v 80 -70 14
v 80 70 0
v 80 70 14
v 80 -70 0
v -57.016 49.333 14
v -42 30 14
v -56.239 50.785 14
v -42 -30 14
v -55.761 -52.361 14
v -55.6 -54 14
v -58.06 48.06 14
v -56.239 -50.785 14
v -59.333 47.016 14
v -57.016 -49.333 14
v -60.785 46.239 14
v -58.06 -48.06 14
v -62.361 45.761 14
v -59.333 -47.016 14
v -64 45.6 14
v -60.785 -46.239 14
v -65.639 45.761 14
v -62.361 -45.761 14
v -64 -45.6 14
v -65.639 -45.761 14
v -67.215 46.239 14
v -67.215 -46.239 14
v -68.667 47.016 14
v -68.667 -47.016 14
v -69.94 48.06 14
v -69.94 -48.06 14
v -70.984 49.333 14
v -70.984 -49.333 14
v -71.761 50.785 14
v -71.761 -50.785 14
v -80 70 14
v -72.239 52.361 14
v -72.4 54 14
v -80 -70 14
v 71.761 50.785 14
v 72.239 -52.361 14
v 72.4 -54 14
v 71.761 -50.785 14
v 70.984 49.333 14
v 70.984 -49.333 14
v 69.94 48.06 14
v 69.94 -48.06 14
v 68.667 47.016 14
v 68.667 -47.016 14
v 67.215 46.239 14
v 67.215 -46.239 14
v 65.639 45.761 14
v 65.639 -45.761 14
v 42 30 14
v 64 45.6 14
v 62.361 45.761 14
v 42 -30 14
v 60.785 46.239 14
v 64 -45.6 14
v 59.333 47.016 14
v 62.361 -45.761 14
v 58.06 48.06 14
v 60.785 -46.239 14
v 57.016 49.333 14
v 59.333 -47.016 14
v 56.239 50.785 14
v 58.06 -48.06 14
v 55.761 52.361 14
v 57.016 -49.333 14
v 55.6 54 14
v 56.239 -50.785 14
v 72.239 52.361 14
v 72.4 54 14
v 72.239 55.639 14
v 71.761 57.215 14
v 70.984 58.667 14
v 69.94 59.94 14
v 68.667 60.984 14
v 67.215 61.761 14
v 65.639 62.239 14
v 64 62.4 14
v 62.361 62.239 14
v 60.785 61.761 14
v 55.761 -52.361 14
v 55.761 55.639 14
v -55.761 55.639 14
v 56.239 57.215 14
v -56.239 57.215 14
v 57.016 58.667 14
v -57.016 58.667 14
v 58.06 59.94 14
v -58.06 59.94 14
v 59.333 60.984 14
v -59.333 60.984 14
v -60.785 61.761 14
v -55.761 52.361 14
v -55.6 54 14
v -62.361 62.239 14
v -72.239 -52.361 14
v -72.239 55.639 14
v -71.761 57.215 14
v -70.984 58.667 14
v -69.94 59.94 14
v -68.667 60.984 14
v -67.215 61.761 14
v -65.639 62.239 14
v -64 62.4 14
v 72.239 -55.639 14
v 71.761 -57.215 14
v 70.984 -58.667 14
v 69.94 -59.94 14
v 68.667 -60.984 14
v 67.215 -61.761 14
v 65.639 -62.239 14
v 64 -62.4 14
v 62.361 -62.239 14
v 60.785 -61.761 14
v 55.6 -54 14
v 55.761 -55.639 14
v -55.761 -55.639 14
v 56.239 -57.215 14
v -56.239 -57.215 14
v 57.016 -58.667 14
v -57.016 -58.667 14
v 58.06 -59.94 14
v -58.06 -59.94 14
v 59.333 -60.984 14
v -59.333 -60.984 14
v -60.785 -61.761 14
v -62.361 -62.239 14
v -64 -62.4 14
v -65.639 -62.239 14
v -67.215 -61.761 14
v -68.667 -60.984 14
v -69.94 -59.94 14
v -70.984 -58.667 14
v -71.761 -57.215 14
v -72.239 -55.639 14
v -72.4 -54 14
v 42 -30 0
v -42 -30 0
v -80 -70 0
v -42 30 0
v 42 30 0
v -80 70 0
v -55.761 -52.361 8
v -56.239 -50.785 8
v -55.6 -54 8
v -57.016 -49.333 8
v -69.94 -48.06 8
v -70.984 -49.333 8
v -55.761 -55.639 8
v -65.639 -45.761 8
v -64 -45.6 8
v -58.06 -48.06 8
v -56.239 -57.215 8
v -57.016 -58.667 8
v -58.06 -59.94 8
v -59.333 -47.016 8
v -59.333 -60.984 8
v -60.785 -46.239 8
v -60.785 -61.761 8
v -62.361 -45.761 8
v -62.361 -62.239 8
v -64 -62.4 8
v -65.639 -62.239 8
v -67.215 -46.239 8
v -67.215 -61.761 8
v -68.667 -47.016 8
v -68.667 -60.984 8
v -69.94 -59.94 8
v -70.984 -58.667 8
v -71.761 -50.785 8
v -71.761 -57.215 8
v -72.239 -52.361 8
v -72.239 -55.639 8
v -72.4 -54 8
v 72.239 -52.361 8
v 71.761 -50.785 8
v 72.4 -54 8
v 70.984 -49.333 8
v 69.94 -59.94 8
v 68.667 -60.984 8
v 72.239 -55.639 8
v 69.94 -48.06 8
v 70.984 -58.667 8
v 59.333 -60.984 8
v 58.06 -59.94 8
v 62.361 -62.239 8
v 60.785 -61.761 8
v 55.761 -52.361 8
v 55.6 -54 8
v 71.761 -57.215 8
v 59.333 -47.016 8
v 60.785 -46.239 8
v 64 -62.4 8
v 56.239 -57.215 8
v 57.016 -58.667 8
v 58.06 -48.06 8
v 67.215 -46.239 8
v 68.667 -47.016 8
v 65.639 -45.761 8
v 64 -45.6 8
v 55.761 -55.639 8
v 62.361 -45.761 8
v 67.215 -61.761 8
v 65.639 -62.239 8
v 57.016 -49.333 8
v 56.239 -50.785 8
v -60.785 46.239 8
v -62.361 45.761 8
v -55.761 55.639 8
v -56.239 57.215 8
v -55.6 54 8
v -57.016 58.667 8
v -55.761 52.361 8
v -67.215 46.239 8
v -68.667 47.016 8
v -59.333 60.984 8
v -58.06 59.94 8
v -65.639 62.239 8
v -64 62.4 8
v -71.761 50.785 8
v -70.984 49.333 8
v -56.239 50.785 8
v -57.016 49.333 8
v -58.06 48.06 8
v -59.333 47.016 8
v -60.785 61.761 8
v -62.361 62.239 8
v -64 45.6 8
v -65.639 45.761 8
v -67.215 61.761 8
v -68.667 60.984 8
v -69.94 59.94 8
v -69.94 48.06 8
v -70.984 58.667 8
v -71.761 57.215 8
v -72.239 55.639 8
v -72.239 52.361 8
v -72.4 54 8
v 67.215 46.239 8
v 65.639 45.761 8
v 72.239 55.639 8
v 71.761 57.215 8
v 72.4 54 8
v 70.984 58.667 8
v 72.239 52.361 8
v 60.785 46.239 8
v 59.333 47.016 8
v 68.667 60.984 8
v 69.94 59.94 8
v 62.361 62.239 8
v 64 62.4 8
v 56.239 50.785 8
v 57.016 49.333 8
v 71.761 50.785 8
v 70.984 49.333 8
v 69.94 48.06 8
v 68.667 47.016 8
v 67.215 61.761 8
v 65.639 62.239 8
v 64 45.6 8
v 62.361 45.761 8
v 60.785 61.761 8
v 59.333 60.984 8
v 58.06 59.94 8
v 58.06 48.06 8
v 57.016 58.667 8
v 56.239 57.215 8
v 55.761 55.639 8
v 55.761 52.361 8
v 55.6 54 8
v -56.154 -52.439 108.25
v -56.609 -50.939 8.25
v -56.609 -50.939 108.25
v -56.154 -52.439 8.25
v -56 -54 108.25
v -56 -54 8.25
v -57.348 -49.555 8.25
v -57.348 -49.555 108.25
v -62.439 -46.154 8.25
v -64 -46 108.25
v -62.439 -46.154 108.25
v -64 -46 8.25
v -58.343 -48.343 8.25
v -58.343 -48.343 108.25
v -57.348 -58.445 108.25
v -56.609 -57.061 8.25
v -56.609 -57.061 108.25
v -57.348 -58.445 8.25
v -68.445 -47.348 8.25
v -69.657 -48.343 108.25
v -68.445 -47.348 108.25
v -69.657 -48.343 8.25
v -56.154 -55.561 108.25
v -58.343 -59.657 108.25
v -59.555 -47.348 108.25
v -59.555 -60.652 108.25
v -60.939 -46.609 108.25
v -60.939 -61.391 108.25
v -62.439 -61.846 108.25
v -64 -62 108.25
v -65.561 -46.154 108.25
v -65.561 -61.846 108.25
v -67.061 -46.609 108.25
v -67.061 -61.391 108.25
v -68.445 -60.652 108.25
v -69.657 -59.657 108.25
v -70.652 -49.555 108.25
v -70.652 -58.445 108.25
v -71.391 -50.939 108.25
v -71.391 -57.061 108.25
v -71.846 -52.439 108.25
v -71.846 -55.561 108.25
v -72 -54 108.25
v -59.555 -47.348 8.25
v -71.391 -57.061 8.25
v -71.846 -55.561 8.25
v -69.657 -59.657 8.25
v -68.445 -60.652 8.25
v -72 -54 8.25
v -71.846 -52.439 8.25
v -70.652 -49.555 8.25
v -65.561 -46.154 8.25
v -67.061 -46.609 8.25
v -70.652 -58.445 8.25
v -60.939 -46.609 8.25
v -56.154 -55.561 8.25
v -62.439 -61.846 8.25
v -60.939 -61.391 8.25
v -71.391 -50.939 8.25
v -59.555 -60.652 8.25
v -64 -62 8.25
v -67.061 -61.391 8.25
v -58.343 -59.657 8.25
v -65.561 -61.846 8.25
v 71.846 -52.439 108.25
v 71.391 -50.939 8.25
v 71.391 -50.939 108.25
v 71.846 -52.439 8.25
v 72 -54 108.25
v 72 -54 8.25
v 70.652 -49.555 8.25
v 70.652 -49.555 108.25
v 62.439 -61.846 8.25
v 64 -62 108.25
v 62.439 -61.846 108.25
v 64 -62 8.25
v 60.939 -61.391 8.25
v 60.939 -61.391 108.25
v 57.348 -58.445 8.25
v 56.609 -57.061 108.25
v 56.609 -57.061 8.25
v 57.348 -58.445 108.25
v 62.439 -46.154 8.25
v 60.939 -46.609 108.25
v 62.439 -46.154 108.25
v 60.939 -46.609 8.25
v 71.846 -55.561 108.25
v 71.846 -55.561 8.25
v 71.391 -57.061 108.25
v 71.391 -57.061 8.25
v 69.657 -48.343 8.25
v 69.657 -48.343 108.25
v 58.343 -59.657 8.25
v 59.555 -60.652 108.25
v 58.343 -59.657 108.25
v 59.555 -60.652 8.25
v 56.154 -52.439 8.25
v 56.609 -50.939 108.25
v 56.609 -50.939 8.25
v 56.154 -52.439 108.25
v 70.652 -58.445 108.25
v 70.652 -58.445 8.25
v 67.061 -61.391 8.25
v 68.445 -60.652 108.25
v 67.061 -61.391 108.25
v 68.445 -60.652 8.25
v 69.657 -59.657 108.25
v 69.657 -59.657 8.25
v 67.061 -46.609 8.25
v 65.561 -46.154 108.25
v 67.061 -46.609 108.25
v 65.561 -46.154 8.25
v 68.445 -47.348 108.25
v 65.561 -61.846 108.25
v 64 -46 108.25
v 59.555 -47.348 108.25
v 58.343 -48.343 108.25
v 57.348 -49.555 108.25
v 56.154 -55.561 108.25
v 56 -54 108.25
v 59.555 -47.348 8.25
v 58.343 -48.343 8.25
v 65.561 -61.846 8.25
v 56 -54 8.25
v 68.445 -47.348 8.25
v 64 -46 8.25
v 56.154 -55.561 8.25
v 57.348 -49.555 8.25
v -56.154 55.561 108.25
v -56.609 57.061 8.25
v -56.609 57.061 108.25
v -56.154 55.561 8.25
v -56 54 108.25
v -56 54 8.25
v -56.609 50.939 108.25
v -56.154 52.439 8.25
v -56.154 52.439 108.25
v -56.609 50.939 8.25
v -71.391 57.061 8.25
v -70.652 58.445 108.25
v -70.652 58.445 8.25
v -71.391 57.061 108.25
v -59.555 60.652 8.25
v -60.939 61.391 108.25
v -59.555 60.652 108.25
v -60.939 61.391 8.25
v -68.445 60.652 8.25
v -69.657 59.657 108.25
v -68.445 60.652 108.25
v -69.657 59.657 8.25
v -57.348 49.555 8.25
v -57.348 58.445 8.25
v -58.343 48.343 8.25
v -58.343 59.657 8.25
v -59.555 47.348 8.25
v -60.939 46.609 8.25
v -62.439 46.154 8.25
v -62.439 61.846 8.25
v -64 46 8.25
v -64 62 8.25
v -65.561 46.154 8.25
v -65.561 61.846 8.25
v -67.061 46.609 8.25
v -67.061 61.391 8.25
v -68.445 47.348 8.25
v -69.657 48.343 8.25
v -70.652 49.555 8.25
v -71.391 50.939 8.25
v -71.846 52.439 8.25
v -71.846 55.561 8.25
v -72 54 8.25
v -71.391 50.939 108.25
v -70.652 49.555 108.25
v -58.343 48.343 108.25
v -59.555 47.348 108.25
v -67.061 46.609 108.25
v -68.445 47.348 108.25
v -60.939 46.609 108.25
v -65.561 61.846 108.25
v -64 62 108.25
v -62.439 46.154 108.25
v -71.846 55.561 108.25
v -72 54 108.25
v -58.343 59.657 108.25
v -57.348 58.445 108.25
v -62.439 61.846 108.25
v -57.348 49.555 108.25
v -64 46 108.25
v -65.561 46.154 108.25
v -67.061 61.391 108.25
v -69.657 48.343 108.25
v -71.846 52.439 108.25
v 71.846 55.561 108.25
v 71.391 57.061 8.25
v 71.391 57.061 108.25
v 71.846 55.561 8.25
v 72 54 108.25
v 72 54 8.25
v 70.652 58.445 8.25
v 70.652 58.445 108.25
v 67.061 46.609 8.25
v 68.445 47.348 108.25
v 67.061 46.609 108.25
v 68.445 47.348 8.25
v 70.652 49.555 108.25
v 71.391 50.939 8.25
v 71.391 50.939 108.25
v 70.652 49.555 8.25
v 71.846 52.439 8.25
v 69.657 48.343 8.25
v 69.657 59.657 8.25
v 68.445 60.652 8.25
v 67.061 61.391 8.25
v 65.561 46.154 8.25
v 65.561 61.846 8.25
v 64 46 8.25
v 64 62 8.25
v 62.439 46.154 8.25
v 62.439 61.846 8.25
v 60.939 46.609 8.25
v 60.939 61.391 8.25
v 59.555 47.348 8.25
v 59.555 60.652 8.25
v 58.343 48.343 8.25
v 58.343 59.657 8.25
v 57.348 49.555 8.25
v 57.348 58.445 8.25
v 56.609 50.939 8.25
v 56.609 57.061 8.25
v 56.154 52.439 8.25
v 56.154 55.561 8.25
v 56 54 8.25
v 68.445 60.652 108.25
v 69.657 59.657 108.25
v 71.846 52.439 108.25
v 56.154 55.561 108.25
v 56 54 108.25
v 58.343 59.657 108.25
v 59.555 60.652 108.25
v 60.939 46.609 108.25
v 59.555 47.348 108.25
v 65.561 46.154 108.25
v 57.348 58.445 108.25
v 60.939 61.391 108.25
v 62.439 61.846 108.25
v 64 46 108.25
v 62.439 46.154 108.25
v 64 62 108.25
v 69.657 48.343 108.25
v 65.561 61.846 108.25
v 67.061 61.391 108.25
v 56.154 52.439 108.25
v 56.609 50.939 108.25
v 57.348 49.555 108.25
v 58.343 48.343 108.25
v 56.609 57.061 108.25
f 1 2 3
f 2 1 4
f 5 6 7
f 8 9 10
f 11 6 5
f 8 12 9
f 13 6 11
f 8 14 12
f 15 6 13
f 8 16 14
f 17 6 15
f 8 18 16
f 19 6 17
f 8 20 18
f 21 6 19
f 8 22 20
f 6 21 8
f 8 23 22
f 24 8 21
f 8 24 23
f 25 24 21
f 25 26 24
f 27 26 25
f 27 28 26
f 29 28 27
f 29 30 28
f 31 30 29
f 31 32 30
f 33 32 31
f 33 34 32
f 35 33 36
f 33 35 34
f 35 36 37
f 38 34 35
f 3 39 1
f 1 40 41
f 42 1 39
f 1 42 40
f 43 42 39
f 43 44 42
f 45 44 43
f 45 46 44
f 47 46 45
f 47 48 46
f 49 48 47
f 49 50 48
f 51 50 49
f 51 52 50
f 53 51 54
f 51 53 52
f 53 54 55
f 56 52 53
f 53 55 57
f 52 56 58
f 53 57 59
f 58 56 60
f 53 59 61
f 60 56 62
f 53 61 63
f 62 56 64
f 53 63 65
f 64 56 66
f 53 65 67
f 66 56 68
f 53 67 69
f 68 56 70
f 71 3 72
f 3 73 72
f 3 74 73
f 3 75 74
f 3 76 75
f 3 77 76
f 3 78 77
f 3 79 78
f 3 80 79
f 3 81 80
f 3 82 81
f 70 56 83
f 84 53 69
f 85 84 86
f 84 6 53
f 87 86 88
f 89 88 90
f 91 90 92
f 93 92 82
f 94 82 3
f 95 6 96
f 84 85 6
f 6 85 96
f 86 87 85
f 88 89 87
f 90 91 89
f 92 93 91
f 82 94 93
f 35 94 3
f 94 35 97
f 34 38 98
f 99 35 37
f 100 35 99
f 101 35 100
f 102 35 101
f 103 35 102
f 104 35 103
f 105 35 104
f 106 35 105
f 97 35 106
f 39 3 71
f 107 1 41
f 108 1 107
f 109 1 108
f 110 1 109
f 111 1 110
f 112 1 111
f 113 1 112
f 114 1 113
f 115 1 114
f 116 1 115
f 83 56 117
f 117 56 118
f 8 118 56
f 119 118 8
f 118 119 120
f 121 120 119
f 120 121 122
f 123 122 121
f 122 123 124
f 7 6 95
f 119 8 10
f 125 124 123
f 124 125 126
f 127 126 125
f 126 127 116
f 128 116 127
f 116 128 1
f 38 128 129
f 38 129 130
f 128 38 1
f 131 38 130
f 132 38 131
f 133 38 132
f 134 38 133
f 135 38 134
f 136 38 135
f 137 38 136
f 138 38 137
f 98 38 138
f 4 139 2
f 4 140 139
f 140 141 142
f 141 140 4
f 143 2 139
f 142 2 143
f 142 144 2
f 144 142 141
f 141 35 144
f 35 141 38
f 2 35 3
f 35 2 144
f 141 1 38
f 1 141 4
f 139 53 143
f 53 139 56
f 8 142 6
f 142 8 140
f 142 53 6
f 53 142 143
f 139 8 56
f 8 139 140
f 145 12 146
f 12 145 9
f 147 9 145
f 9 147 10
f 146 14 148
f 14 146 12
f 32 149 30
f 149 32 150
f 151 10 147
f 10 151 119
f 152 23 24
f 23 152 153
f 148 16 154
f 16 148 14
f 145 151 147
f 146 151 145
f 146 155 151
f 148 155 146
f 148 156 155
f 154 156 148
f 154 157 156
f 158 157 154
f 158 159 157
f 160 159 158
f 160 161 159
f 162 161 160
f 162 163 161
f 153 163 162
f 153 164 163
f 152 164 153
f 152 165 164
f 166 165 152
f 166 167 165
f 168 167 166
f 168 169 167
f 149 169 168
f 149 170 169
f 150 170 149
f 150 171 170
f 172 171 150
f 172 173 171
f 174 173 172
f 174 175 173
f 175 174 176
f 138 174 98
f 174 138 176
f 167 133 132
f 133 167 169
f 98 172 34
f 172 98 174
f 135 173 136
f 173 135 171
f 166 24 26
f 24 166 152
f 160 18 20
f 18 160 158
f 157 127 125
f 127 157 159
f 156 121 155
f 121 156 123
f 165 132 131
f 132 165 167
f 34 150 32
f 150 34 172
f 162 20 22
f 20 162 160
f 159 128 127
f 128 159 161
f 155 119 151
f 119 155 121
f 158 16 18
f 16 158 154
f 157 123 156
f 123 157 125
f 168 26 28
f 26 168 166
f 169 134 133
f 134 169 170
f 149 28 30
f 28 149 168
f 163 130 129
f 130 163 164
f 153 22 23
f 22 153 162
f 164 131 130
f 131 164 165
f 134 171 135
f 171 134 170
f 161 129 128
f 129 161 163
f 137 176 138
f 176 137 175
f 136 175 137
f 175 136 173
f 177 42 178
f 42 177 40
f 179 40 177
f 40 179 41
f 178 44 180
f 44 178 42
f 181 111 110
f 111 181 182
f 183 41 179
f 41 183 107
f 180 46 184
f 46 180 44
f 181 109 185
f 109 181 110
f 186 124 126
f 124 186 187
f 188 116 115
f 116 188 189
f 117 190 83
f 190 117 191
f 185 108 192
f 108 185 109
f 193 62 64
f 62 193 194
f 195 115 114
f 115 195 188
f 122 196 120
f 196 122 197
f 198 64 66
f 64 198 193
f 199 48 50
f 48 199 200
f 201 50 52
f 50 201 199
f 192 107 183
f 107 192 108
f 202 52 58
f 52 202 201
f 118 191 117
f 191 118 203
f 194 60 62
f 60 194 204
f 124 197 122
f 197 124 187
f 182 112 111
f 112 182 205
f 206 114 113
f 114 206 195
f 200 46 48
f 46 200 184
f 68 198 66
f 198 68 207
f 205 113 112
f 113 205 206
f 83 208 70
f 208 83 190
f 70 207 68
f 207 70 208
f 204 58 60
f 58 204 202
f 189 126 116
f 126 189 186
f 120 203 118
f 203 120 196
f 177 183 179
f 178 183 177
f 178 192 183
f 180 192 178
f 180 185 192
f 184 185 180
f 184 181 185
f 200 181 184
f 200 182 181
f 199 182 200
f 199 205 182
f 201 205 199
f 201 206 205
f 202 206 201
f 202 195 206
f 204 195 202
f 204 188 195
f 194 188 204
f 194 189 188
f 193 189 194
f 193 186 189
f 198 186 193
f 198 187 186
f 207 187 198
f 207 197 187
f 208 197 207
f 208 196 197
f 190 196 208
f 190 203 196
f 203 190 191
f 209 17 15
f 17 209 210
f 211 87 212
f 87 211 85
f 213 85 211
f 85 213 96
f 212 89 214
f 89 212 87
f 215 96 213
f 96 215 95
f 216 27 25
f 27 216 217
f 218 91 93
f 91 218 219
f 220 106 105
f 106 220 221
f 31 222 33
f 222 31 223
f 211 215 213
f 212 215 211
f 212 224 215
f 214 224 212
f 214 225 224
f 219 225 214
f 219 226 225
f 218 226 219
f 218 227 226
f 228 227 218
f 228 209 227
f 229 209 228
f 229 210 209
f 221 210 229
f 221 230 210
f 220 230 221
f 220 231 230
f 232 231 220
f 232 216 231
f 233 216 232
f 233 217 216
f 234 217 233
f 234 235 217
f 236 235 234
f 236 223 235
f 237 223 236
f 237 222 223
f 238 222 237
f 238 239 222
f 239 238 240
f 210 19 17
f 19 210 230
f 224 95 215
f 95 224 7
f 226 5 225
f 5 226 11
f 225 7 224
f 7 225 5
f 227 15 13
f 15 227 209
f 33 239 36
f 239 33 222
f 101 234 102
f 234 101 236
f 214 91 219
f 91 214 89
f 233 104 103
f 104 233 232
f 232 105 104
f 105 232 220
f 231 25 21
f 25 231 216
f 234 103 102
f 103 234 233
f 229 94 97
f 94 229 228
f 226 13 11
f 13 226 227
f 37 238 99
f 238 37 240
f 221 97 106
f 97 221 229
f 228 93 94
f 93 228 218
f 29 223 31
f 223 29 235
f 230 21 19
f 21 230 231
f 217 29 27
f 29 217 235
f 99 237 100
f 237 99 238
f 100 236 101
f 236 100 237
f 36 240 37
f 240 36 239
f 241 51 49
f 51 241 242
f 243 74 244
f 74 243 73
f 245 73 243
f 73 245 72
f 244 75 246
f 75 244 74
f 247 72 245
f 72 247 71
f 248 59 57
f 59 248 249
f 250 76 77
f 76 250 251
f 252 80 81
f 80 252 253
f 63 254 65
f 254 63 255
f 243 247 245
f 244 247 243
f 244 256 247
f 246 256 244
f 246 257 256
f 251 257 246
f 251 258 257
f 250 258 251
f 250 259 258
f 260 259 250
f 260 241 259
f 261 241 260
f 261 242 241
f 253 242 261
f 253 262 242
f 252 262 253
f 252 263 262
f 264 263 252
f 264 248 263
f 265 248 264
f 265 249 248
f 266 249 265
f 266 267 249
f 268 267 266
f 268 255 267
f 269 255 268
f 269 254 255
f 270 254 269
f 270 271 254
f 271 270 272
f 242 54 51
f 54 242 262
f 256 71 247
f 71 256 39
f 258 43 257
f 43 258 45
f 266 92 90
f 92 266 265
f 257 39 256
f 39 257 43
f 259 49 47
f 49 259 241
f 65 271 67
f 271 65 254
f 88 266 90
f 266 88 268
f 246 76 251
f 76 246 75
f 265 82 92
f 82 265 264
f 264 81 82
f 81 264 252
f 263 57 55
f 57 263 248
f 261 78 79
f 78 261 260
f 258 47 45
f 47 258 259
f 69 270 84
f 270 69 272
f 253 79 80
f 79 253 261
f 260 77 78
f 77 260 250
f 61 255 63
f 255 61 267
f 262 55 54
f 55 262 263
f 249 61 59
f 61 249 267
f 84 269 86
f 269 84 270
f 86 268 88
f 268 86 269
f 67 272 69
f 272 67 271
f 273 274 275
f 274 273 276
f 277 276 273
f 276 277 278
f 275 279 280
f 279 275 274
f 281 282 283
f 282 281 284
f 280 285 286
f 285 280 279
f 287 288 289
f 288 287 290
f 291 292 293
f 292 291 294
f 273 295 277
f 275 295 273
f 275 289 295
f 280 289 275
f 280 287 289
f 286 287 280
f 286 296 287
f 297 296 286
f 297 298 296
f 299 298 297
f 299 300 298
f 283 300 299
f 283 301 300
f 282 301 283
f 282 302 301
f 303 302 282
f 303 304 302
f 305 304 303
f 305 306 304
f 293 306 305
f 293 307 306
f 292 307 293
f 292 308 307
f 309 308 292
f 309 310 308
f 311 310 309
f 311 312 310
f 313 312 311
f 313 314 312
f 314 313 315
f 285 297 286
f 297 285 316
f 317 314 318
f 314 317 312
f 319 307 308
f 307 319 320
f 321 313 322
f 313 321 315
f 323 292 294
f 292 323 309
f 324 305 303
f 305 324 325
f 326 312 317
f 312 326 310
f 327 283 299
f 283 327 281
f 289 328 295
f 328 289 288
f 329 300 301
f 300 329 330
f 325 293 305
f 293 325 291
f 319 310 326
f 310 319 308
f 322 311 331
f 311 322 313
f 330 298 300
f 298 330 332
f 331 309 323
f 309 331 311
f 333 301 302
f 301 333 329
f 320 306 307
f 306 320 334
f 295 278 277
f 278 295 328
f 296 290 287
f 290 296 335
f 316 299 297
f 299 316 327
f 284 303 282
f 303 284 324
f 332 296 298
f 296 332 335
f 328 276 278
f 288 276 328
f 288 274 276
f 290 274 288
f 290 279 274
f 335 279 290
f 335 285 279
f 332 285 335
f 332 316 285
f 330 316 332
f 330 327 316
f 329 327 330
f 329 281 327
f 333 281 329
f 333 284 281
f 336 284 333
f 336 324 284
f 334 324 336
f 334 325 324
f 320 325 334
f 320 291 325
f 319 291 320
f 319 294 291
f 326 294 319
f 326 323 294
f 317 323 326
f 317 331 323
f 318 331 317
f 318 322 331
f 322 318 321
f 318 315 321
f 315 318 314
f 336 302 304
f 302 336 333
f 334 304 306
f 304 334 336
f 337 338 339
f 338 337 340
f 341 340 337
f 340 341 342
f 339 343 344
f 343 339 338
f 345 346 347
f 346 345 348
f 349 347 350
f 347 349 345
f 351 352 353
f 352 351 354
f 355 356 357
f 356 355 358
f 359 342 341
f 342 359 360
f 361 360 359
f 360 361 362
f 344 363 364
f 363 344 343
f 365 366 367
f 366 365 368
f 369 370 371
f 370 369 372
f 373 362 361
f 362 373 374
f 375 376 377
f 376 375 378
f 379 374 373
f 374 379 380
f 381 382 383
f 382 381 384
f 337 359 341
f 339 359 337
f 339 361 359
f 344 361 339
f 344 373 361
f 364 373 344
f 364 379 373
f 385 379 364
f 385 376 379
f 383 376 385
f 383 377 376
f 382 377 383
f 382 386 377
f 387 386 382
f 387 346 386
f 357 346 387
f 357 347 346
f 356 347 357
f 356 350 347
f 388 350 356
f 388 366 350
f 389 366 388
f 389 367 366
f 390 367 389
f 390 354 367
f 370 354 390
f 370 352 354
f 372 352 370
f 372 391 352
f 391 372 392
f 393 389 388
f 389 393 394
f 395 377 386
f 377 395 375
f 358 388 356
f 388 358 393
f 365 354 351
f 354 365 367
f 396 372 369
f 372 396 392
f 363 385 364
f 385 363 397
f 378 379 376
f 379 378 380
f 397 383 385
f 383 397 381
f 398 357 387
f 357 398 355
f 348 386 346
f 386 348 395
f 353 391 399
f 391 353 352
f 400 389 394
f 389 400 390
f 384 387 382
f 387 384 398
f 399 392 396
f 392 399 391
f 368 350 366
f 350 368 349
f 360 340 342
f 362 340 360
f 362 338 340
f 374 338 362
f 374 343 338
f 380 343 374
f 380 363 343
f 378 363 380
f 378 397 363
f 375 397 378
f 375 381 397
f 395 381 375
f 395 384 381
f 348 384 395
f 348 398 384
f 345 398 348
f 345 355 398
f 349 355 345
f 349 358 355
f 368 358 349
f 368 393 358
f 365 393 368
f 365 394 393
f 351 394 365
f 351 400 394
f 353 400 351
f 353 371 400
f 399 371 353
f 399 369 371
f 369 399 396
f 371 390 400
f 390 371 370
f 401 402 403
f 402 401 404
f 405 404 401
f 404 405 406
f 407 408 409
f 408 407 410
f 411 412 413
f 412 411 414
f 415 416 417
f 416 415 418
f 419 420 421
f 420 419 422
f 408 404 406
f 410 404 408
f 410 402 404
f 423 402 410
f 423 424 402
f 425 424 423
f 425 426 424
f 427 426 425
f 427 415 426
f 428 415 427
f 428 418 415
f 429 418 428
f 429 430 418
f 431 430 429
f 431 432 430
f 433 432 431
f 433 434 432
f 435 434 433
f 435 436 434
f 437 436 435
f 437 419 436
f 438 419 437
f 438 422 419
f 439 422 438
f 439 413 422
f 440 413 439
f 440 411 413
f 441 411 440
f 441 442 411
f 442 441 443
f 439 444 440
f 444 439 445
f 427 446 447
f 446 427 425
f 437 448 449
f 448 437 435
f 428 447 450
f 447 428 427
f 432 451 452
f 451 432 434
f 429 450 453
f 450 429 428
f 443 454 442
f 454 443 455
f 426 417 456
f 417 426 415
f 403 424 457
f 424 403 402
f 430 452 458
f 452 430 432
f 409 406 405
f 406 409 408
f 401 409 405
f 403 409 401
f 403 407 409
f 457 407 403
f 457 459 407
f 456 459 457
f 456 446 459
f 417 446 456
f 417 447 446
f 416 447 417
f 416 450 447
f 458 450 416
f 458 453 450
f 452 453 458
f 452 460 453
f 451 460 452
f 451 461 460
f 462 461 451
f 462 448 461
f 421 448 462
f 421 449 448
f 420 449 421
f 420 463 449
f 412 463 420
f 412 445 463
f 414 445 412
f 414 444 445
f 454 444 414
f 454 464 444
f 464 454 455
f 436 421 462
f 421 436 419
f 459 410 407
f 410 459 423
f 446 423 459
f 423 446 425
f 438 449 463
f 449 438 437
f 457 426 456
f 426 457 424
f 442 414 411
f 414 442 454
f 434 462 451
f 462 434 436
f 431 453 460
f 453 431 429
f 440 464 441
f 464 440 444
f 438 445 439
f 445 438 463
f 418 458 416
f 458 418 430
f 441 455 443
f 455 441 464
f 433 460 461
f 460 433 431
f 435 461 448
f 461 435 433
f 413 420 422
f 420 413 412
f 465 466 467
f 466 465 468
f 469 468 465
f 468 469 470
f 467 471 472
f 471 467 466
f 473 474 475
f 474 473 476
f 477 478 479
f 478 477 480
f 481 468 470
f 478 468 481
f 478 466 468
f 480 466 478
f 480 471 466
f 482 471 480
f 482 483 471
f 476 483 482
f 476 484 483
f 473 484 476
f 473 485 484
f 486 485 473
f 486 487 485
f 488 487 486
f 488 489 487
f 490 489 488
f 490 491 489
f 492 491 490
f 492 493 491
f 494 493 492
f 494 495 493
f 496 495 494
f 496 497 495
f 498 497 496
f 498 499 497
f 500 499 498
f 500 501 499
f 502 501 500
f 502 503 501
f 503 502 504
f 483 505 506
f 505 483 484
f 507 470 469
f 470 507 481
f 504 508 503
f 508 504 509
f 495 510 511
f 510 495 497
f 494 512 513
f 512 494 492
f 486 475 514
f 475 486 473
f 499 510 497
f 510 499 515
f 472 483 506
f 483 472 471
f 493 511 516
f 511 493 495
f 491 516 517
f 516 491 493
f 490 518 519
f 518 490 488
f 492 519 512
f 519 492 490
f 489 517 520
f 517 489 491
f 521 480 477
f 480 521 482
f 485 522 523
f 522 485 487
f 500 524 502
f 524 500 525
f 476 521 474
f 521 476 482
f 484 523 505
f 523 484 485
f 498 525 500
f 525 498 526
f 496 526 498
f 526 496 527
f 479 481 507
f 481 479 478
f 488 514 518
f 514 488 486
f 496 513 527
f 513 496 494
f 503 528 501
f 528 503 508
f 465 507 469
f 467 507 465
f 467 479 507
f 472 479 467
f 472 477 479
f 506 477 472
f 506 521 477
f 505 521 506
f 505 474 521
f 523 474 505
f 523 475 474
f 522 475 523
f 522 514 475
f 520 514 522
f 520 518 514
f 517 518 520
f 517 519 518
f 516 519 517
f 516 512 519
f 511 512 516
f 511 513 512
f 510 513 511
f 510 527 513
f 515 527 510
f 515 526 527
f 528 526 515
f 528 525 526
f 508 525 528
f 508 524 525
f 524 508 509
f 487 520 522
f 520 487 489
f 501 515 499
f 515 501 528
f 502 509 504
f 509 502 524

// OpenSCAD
$fn = 32;

// ------------------------------------------------------------------------
// Frame with four posts: 160 x 140 mm frame, four d16 posts
// Every part is its own module, assembly() places them once.
// ------------------------------------------------------------------------

// --- part 1 ---
module base_frame() {
  difference() {
    translate([-80, -70, 0]) cube([160, 140, 14]);
    translate([-42, -30, -1]) cube([84, 60, 16]);
    translate([-64, -54, 8]) cylinder(h = 7, d = 16.8);
    translate([64, -54, 8]) cylinder(h = 7, d = 16.8);
    translate([-64, 54, 8]) cylinder(h = 7, d = 16.8);
    translate([64, 54, 8]) cylinder(h = 7, d = 16.8);
  }
}

// --- part 2 ---
module post1() {
  cylinder(h = 100, d = 16);
}

// --- part 3 ---
module post2() {
  cylinder(h = 100, d = 16);
}

// --- part 4 ---
module post3() {
  cylinder(h = 100, d = 16);
}

// --- part 5 ---
module post4() {
  cylinder(h = 100, d = 16);
}

// --- assembly ---
module assembly() {
  translate([0, 0, 0]) rotate([0, 0, 0]) base_frame();
  translate([-64, -54, 8.25]) rotate([0, 0, 0]) post1();
  translate([64, -54, 8.25]) rotate([0, 0, 0]) post2();
  translate([-64, 54, 8.25]) rotate([0, 0, 0]) post3();
  translate([64, 54, 8.25]) rotate([0, 0, 0]) post4();
}

assembly();
